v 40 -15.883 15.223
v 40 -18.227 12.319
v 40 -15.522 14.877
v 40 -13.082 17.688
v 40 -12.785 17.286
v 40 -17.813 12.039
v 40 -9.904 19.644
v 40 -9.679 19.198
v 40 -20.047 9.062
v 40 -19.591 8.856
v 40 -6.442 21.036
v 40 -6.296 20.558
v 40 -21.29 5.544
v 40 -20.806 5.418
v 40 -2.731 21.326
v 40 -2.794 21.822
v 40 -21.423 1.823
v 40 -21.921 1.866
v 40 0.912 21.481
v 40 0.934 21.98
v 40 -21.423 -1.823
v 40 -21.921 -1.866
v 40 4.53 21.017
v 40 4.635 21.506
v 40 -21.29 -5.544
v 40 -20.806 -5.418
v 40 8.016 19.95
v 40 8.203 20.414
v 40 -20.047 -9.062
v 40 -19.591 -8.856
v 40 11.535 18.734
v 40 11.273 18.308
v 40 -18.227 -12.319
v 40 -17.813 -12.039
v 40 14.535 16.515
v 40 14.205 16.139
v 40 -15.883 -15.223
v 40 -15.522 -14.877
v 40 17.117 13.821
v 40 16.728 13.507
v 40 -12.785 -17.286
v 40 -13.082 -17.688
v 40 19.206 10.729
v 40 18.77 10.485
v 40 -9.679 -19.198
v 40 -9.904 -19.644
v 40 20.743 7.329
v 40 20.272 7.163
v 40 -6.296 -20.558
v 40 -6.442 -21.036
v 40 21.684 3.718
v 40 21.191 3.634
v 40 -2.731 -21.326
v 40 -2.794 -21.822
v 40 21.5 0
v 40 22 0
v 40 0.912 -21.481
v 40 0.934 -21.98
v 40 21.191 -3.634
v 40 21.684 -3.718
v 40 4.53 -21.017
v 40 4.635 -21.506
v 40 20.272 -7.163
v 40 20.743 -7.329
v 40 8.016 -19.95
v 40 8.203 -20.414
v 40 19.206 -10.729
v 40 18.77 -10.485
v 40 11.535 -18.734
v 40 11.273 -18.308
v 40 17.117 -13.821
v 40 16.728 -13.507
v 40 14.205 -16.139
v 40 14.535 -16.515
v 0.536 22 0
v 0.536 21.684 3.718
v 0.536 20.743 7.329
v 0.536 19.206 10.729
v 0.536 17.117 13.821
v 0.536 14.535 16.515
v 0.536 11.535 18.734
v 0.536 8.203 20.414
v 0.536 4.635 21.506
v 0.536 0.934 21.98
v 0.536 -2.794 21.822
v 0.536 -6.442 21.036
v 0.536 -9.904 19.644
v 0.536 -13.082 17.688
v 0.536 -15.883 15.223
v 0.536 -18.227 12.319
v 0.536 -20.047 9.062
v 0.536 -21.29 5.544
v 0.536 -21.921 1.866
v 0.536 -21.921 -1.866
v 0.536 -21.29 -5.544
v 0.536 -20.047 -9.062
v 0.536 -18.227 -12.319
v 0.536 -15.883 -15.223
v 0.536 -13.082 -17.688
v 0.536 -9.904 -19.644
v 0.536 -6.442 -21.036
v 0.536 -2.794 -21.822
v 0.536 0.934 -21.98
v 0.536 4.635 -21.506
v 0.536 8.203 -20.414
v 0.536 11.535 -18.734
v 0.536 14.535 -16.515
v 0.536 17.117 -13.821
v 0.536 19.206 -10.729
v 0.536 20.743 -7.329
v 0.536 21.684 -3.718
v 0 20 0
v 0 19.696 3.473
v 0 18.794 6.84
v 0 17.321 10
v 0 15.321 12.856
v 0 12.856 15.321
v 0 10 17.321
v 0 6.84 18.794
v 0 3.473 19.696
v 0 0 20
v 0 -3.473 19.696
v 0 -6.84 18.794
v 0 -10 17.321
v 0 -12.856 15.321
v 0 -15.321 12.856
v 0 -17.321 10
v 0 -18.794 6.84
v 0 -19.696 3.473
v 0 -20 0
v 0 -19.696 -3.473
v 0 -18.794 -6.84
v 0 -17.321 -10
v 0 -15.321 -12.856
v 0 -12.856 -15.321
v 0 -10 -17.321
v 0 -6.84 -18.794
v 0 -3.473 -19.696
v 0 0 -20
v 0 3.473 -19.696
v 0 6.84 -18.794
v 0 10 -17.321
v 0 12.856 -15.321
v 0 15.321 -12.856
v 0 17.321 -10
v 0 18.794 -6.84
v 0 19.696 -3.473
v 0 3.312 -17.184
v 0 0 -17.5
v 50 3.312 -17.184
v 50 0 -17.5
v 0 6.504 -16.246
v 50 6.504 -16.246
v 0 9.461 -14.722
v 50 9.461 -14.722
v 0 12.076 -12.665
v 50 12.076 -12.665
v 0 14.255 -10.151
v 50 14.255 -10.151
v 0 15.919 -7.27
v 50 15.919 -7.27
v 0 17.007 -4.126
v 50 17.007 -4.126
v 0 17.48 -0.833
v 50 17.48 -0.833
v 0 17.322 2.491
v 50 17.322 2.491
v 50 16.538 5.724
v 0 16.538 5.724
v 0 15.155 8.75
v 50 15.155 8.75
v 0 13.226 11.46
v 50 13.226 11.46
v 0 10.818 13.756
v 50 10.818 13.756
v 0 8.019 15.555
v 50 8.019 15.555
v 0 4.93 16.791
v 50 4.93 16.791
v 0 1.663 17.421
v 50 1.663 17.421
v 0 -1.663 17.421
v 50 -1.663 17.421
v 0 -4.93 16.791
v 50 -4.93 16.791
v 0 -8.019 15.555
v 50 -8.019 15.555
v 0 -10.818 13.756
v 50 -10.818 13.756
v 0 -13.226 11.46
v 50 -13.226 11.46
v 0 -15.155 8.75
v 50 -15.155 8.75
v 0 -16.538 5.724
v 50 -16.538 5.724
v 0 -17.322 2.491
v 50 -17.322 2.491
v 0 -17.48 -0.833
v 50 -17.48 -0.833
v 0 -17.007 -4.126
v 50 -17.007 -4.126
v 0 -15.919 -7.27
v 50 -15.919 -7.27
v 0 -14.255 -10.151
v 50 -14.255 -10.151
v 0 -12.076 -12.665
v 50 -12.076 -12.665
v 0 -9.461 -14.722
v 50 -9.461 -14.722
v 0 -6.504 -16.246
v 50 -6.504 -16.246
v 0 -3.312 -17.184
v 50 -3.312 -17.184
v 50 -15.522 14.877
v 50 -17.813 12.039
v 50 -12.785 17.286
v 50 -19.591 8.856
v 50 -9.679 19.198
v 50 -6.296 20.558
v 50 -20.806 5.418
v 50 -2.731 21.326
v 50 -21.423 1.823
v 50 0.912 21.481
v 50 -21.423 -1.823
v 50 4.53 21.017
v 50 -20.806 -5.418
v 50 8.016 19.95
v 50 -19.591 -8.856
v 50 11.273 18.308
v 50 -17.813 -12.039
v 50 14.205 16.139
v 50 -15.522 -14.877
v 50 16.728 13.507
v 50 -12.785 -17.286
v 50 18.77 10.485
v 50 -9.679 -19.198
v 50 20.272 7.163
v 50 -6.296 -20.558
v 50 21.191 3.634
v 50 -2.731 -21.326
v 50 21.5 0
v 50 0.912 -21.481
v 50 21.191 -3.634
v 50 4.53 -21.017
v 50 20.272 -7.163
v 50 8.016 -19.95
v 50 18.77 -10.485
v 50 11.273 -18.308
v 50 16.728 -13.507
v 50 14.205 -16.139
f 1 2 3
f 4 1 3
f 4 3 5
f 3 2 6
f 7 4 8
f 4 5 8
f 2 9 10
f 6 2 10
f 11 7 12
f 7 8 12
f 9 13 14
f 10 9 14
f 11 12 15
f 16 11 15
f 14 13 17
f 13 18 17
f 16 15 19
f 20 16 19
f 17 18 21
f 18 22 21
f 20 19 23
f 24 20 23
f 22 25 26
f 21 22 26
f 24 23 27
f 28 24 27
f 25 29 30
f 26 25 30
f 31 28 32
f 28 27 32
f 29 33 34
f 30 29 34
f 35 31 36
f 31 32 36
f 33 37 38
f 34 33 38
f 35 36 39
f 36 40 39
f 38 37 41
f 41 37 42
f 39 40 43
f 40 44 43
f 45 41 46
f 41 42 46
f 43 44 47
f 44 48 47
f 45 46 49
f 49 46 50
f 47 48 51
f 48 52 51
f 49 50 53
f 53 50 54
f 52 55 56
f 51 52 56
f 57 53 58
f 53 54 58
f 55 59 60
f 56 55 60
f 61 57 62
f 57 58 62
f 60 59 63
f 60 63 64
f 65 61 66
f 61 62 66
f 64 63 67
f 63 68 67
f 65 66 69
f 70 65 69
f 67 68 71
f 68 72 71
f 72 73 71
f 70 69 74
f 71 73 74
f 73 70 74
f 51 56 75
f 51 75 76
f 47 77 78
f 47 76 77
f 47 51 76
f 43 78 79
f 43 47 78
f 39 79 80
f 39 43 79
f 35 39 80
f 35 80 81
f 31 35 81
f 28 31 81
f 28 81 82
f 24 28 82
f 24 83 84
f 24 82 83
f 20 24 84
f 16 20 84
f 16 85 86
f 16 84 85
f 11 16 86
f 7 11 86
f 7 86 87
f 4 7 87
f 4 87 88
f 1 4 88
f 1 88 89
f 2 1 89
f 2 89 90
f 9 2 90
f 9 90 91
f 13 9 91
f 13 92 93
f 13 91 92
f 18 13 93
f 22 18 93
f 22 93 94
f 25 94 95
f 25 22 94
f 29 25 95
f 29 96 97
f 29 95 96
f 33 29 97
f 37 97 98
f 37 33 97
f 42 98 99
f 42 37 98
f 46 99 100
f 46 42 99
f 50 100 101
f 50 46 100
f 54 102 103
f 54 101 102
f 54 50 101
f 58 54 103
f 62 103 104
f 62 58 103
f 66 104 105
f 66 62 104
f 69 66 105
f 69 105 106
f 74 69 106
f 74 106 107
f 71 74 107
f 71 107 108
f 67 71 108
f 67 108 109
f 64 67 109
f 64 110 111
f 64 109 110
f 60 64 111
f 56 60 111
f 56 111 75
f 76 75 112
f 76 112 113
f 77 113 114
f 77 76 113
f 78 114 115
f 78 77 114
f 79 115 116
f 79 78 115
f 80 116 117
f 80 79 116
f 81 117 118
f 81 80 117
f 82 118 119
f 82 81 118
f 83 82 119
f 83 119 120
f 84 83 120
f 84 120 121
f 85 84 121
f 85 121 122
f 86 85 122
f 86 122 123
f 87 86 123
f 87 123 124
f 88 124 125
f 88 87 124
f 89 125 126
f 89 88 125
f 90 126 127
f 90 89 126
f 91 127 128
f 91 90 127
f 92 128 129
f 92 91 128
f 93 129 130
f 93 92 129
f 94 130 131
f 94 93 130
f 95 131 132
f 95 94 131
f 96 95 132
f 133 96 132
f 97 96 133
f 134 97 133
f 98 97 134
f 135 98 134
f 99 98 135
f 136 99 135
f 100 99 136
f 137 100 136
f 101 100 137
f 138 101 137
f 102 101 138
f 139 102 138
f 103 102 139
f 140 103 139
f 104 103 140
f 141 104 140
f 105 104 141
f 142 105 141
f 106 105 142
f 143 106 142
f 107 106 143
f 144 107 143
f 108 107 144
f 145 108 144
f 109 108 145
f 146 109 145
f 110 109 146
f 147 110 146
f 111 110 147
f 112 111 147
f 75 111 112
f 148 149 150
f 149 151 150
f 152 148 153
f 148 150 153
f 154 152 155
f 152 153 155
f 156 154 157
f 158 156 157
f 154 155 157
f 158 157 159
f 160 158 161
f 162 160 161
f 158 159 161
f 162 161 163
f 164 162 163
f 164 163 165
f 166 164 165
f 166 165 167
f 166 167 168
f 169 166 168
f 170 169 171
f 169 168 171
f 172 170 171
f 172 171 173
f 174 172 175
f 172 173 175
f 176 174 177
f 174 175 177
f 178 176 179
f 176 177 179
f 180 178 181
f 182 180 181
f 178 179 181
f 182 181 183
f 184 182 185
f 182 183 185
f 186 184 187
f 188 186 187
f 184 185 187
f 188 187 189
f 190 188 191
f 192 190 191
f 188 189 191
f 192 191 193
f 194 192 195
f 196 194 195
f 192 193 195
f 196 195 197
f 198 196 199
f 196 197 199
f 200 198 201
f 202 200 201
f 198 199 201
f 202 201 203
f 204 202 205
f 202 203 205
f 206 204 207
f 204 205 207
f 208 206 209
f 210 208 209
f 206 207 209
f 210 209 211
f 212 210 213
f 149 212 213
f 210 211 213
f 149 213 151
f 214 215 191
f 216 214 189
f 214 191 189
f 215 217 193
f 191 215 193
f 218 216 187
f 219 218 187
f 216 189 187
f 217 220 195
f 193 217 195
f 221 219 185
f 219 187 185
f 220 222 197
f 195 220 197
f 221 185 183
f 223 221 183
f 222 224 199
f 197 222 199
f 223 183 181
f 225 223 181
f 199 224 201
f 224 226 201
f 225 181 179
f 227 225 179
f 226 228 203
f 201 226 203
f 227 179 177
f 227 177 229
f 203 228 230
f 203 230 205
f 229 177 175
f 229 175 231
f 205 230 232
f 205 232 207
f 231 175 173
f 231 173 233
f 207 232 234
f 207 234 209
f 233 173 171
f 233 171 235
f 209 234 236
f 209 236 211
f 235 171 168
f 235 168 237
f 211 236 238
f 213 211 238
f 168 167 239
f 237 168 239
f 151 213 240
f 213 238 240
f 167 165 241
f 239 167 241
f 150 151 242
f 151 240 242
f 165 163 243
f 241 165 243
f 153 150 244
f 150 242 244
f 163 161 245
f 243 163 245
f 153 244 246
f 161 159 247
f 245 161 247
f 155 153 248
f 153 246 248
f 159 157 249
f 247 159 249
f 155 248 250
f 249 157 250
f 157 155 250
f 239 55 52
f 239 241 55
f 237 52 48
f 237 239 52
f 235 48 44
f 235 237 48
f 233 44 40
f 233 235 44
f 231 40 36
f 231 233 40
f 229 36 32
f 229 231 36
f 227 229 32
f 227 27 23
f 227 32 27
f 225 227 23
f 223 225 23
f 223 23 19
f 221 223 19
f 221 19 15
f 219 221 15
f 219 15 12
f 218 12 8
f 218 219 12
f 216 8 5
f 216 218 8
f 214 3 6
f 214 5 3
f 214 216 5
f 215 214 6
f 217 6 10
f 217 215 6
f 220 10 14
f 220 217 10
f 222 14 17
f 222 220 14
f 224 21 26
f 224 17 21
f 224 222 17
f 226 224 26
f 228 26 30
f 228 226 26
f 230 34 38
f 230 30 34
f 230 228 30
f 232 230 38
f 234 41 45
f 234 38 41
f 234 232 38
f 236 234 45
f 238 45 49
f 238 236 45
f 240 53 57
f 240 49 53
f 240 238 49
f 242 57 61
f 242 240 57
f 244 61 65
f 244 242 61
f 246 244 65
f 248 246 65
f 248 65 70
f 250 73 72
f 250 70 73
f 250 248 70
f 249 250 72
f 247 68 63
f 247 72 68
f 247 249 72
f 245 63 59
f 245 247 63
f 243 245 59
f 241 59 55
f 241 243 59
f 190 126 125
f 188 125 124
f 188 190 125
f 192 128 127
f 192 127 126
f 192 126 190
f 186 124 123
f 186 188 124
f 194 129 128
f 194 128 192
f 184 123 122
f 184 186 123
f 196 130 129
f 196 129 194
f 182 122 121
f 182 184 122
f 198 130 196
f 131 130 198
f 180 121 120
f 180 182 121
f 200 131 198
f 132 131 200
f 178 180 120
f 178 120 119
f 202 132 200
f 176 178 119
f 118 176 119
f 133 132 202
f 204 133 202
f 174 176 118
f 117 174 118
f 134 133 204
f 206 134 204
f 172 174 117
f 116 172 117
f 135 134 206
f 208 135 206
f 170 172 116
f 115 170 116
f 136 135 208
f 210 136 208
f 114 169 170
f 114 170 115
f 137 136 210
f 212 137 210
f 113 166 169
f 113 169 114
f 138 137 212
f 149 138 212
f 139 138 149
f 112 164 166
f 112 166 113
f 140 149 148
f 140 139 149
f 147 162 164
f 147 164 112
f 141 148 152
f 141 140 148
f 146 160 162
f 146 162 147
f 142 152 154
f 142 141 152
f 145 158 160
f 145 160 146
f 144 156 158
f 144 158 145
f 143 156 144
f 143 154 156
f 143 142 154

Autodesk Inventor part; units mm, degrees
ref_plane "YZ Plane" through (0, 0, 0) normal (1, 0, 0) x (0, 1, 0)
ref_plane "XZ Plane" through (0, 0, 0) normal (0, 1, 0) x (-1, 0, 0)
ref_plane "XY Plane" through (0, 0, 0) normal (0, 0, 1) x (1, 0, 0)
sketch "Skizze1" plane through (0, 0, 0) normal (0, 0, 1) x (1, 0, 0)
  line L0 (0, 0) -> (0, 22)
  line L1 (0, 22) -> (40, 22)
  line L2 (40, 22) -> (40, 21.5)
  line L3 (40, 21.5) -> (50, 21.5)
  line L4 (50, 21.5) -> (50, 0)
  line L5 (50, 0) -> (0, 0)
  dimension "d0" = 44
  dimension "d1" = 43
  dimension "d2" = 40
  dimension "d3" = 50
revolve "Umdrehung1" add sketch "Skizze1" angle 360 about axis through (50, 0, 0) along (-1, 0, 0)
chamfer "Fasen1" distance 2 angle 15 1 edges at (0, -22, 0) measured on face at (0, -5.3524, -1.755)
sketch "Skizze2" plane through (50, 0, 0) normal (1, 0, 0) x (0, 0, -1)
  circle A0 centre (0, 0) radius 17.5
  dimension "d8" = 35
extrude "Extrusion1" cut sketch "Skizze2" against normal up to surface (50 mm away)
properties part number "Zylinder_laufbuechse" material "Glas"
